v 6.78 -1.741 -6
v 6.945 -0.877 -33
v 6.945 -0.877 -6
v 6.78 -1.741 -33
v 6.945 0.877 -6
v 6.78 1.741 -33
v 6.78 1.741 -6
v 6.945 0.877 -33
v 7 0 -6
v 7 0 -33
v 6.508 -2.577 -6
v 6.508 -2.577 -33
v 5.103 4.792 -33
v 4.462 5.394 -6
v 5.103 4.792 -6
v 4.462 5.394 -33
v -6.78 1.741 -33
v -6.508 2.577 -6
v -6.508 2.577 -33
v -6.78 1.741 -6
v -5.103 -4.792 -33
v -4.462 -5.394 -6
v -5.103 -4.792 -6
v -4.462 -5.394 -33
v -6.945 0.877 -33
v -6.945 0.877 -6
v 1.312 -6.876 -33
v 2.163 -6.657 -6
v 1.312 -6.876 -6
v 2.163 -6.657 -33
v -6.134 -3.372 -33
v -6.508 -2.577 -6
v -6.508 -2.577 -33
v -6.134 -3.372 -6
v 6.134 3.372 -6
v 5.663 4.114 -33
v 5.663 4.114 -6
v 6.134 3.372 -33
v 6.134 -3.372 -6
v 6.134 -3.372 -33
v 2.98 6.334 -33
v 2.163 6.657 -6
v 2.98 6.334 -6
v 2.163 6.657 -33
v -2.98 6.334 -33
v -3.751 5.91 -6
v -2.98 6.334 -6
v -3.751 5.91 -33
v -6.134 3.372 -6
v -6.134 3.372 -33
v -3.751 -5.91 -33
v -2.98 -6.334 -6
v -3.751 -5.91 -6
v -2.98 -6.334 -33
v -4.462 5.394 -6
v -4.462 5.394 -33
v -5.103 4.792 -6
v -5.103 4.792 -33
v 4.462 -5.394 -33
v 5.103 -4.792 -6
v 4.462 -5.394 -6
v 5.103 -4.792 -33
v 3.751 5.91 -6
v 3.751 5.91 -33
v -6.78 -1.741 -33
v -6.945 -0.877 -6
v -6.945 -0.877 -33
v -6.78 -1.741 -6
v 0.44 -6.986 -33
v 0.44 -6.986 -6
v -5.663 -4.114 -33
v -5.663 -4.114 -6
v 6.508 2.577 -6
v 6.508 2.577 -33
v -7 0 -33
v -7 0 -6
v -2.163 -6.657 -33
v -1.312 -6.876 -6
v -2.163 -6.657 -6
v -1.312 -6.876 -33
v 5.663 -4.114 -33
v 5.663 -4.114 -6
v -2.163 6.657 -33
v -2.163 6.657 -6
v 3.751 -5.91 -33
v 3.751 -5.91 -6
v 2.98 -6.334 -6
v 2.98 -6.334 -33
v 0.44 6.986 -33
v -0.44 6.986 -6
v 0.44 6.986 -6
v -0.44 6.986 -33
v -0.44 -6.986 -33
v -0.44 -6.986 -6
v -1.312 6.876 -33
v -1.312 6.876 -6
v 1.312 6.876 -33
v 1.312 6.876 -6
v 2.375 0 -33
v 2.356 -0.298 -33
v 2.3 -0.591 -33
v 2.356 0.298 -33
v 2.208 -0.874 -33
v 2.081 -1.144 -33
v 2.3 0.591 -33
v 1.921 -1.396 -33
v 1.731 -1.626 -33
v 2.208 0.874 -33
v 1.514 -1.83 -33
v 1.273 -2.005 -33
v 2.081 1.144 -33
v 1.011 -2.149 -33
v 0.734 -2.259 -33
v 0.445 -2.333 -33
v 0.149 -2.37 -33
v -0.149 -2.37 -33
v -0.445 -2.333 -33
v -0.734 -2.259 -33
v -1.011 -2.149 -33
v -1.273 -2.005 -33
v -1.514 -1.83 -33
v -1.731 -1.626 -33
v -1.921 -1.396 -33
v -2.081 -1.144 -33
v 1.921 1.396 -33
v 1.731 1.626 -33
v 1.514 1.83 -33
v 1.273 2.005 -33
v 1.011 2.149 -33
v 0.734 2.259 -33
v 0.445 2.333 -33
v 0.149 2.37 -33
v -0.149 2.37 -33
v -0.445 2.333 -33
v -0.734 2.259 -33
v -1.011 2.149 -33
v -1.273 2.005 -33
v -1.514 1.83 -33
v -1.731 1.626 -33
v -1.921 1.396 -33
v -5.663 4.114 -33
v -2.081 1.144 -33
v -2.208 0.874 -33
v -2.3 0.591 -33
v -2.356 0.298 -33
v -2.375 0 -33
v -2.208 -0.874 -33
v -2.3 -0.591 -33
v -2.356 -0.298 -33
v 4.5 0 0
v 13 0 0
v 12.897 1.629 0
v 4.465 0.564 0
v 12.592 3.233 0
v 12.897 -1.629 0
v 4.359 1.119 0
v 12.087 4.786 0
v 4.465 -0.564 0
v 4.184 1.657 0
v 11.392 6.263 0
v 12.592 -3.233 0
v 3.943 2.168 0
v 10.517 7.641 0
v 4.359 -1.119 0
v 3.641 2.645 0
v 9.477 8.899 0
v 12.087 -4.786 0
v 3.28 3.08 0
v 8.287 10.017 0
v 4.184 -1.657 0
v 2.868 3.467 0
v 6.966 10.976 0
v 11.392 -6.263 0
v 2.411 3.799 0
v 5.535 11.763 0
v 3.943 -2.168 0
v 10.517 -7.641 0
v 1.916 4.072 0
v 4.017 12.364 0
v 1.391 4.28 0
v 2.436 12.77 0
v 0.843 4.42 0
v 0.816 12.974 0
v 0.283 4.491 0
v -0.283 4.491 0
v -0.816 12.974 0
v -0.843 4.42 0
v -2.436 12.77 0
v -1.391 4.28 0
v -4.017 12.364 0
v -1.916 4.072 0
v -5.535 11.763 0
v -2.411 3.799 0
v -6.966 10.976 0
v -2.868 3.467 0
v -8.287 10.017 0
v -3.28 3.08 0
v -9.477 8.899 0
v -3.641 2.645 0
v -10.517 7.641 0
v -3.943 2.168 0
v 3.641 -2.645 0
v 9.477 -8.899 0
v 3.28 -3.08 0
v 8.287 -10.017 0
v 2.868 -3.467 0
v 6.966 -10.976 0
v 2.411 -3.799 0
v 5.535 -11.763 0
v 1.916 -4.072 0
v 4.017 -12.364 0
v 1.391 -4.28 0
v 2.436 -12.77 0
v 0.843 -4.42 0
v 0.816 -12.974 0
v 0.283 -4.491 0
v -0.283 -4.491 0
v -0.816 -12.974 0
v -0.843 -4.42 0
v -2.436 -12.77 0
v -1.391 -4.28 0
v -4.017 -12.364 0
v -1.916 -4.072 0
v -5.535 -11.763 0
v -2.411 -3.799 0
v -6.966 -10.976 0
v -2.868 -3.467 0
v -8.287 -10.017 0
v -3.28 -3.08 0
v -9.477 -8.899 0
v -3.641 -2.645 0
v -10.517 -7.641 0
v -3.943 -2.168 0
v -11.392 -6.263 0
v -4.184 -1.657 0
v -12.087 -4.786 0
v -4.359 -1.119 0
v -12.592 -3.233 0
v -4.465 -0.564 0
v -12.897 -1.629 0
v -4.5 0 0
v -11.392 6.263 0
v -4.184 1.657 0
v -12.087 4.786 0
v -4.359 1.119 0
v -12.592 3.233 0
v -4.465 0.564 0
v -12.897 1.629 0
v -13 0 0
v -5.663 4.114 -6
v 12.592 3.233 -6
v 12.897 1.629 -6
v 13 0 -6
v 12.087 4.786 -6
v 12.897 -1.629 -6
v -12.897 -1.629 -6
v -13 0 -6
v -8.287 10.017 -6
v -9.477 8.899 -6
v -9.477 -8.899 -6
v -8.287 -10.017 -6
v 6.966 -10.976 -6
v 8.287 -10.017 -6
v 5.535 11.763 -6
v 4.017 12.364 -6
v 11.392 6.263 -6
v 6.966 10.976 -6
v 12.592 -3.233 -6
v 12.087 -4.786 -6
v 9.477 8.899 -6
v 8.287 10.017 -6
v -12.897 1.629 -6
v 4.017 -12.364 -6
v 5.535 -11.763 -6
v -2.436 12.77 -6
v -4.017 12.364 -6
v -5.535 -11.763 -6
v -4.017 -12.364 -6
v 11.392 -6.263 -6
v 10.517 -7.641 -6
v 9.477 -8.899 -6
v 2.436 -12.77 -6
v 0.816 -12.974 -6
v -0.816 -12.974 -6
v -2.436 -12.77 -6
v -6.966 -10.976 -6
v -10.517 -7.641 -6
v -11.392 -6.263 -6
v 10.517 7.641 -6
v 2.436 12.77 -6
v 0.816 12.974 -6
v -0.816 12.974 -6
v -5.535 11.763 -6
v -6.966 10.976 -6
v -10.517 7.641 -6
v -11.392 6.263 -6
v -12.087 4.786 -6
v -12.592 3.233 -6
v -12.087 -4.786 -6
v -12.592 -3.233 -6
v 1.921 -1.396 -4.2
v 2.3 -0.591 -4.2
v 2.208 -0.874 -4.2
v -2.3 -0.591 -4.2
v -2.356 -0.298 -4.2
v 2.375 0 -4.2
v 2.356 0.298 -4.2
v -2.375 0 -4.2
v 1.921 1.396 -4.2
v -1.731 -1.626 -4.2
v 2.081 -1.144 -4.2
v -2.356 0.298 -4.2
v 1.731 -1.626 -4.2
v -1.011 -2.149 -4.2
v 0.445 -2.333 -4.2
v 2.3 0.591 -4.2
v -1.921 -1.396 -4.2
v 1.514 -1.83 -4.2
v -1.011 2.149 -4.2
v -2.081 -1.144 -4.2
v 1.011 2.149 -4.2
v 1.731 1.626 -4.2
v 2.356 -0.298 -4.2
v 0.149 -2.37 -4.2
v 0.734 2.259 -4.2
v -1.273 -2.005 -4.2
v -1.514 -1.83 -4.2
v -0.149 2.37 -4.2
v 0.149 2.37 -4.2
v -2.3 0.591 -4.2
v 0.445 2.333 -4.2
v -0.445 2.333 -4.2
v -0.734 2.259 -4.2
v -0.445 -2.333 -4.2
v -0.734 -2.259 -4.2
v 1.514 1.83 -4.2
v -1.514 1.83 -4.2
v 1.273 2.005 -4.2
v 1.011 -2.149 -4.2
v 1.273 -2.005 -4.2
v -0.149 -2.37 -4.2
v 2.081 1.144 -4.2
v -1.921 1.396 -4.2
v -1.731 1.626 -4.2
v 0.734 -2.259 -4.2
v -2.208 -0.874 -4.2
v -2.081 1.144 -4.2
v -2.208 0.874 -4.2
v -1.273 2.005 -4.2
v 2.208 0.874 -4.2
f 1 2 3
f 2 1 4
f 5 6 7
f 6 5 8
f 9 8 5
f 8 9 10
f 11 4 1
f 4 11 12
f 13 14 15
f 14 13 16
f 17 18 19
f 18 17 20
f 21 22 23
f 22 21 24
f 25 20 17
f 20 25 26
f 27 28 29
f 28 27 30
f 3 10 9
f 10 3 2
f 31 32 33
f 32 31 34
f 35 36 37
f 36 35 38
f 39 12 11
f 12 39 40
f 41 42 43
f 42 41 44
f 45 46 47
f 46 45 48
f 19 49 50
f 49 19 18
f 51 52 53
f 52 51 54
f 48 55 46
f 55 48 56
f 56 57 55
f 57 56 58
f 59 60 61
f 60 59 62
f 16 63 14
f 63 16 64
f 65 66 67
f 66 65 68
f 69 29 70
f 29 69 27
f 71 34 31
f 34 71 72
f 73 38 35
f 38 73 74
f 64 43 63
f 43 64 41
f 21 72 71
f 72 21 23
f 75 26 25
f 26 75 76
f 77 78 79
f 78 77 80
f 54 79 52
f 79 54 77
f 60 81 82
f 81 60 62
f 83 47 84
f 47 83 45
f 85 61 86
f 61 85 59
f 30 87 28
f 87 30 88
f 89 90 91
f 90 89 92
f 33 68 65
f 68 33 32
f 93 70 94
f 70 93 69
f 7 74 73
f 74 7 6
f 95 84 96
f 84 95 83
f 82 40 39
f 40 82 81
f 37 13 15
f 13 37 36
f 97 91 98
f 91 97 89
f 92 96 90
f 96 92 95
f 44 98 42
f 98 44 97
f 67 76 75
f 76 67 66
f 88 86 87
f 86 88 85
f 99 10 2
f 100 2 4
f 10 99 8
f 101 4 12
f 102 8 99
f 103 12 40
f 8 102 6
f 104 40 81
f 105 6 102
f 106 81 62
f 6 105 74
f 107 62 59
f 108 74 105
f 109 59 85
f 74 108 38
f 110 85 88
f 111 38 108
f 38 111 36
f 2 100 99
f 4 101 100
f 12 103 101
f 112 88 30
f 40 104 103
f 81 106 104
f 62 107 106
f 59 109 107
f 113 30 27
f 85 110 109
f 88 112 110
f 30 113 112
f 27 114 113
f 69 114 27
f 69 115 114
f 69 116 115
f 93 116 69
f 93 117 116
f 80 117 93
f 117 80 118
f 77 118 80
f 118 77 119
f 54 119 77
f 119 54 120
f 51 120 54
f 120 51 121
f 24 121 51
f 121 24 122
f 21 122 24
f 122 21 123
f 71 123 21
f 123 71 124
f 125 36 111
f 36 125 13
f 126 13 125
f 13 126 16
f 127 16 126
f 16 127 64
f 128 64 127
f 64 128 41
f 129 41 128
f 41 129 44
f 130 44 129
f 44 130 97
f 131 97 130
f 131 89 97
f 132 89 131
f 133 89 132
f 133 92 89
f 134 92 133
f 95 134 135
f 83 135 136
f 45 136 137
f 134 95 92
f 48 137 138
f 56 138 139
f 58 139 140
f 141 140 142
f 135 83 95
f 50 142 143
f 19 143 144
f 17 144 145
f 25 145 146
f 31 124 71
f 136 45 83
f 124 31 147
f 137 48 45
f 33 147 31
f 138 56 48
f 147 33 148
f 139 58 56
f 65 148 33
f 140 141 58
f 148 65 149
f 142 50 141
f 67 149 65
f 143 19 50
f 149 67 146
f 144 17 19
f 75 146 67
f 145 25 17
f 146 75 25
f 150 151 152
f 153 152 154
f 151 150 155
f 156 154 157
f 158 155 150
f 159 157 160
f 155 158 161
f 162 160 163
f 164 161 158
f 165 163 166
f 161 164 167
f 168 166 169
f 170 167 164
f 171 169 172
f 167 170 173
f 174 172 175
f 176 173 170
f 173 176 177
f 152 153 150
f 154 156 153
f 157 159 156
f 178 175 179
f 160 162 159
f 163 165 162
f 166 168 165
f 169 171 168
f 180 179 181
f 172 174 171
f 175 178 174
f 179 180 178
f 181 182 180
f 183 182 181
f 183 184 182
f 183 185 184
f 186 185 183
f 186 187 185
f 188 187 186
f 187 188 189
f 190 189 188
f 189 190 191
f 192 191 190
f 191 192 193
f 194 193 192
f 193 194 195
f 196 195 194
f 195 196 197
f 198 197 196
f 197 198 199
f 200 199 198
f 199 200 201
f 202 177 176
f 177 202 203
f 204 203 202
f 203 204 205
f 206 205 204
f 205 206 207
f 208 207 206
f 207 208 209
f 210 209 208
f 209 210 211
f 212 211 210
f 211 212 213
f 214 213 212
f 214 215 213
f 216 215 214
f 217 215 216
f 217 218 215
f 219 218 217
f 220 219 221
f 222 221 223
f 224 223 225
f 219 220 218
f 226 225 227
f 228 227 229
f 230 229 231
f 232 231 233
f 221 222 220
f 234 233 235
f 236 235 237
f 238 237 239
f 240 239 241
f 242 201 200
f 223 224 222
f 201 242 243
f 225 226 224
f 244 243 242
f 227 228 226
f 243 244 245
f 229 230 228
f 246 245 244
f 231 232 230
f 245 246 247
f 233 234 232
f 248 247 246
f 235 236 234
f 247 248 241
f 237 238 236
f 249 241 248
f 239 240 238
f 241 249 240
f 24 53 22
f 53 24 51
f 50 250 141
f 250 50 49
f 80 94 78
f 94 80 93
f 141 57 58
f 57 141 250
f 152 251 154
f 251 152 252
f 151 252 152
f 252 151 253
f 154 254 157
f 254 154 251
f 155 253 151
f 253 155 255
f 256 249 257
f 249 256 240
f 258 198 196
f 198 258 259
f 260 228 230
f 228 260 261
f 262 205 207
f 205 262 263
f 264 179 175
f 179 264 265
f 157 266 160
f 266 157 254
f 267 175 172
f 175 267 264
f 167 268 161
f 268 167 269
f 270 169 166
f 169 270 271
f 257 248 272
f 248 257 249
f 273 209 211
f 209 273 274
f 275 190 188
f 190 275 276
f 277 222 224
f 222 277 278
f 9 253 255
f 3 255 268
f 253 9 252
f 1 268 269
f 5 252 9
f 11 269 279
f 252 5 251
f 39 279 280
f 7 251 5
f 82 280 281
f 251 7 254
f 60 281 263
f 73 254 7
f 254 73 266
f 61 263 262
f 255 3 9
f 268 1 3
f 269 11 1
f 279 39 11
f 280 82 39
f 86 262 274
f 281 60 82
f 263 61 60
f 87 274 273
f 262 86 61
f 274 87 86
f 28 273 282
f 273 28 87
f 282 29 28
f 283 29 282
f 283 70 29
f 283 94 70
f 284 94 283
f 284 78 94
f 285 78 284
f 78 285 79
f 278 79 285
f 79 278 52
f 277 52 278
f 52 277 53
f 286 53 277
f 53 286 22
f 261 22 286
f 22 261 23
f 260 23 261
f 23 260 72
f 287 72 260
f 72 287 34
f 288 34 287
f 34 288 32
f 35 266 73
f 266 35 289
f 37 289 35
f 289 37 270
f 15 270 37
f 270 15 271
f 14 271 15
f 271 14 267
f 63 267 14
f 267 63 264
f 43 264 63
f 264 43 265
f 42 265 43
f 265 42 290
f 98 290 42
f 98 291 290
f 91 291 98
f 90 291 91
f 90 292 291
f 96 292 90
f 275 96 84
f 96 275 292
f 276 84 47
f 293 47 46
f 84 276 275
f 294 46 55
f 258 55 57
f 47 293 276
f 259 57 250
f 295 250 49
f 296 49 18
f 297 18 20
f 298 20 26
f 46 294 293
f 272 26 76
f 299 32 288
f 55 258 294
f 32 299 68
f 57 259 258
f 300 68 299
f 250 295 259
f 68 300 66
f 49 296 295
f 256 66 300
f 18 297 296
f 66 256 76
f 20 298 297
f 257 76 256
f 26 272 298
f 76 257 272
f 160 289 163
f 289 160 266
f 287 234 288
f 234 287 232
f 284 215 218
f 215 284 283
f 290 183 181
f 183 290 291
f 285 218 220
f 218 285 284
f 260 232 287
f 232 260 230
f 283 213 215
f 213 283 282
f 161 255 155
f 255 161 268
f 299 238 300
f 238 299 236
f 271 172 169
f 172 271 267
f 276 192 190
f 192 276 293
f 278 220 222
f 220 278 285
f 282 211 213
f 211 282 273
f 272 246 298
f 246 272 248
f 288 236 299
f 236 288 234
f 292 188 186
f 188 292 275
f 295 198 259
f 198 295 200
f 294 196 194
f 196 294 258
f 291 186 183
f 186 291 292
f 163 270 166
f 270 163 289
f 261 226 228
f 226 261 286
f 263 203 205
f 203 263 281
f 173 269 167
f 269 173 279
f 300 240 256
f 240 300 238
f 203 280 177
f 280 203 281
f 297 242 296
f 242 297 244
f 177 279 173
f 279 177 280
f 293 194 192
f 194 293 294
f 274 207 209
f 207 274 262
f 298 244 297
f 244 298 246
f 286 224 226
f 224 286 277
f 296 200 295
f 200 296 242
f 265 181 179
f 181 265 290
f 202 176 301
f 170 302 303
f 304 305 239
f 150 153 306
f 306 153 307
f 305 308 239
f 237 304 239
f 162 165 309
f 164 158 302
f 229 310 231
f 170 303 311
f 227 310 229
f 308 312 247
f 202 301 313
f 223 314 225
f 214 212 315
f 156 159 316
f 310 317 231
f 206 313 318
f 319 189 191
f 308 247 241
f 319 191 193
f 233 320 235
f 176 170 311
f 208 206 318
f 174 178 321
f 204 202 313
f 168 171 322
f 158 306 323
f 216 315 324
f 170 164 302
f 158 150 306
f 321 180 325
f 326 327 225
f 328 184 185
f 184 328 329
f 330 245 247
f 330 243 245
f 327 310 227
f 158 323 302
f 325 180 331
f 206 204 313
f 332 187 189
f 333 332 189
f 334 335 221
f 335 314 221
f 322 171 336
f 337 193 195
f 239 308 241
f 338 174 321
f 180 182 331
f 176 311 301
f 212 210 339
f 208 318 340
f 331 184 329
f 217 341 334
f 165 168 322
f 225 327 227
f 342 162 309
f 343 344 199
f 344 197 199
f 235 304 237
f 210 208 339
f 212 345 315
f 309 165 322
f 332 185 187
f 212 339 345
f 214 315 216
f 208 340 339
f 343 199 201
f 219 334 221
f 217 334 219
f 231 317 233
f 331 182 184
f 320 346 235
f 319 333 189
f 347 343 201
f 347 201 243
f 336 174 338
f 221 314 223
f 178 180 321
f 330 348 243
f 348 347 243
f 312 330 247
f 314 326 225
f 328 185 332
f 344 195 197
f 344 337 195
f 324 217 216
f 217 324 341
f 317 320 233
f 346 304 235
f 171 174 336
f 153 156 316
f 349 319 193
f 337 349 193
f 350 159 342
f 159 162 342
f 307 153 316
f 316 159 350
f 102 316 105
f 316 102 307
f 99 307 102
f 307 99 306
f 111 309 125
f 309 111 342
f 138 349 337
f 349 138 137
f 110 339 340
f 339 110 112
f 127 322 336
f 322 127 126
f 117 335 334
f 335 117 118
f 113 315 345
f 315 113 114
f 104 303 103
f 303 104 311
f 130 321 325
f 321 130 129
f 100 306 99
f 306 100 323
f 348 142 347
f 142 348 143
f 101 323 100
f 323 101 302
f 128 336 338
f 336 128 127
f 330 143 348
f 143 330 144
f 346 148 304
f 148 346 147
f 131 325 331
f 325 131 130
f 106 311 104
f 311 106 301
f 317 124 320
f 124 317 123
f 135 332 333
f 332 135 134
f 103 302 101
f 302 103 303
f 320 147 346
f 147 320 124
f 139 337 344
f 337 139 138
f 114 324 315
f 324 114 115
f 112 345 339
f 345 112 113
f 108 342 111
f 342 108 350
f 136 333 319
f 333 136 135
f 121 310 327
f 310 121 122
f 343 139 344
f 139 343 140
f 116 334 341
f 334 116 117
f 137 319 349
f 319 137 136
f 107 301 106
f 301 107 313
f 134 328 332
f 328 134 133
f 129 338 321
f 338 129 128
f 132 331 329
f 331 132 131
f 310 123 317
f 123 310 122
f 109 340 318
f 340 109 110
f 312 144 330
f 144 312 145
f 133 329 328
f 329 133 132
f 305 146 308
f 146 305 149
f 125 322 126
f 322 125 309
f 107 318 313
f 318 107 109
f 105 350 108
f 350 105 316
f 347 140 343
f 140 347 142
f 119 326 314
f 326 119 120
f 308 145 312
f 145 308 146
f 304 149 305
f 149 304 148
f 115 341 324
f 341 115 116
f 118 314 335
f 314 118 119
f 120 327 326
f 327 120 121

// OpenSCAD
$fn = 50;


difference() {
	union() {
		translate(v = [0, 0, -33.0000000000]) {
			cylinder(h = 33, r = 7.0000000000);
		}
		translate(v = [0, 0, -6.0000000000]) {
			cylinder(h = 6, r = 13.0000000000);
		}
	}
	union() {
		translate(v = [0, 0, 0]) {
			rotate(a = [0, 0, 0]) {
				difference() {
					union() {
						#translate(v = [0, 0, -33.0000000000]) {
							cylinder(h = 33, r = 2.2500000000);
						}
						#translate(v = [0, 0, -4.2000000000]) {
							cylinder(h = 4.2000000000, r = 7.0000000000, r1 = 2.3750000000, r2 = 4.5000000000);
						}
						#translate(v = [0, 0, -33.0000000000]) {
							cylinder(h = 33, r = 2.3750000000);
						}
						#translate(v = [0, 0, -33.0000000000]) {
							cylinder(h = 33, r = 2.2500000000);
						}
					}
					union();
				}
			}
		}
	}
}
